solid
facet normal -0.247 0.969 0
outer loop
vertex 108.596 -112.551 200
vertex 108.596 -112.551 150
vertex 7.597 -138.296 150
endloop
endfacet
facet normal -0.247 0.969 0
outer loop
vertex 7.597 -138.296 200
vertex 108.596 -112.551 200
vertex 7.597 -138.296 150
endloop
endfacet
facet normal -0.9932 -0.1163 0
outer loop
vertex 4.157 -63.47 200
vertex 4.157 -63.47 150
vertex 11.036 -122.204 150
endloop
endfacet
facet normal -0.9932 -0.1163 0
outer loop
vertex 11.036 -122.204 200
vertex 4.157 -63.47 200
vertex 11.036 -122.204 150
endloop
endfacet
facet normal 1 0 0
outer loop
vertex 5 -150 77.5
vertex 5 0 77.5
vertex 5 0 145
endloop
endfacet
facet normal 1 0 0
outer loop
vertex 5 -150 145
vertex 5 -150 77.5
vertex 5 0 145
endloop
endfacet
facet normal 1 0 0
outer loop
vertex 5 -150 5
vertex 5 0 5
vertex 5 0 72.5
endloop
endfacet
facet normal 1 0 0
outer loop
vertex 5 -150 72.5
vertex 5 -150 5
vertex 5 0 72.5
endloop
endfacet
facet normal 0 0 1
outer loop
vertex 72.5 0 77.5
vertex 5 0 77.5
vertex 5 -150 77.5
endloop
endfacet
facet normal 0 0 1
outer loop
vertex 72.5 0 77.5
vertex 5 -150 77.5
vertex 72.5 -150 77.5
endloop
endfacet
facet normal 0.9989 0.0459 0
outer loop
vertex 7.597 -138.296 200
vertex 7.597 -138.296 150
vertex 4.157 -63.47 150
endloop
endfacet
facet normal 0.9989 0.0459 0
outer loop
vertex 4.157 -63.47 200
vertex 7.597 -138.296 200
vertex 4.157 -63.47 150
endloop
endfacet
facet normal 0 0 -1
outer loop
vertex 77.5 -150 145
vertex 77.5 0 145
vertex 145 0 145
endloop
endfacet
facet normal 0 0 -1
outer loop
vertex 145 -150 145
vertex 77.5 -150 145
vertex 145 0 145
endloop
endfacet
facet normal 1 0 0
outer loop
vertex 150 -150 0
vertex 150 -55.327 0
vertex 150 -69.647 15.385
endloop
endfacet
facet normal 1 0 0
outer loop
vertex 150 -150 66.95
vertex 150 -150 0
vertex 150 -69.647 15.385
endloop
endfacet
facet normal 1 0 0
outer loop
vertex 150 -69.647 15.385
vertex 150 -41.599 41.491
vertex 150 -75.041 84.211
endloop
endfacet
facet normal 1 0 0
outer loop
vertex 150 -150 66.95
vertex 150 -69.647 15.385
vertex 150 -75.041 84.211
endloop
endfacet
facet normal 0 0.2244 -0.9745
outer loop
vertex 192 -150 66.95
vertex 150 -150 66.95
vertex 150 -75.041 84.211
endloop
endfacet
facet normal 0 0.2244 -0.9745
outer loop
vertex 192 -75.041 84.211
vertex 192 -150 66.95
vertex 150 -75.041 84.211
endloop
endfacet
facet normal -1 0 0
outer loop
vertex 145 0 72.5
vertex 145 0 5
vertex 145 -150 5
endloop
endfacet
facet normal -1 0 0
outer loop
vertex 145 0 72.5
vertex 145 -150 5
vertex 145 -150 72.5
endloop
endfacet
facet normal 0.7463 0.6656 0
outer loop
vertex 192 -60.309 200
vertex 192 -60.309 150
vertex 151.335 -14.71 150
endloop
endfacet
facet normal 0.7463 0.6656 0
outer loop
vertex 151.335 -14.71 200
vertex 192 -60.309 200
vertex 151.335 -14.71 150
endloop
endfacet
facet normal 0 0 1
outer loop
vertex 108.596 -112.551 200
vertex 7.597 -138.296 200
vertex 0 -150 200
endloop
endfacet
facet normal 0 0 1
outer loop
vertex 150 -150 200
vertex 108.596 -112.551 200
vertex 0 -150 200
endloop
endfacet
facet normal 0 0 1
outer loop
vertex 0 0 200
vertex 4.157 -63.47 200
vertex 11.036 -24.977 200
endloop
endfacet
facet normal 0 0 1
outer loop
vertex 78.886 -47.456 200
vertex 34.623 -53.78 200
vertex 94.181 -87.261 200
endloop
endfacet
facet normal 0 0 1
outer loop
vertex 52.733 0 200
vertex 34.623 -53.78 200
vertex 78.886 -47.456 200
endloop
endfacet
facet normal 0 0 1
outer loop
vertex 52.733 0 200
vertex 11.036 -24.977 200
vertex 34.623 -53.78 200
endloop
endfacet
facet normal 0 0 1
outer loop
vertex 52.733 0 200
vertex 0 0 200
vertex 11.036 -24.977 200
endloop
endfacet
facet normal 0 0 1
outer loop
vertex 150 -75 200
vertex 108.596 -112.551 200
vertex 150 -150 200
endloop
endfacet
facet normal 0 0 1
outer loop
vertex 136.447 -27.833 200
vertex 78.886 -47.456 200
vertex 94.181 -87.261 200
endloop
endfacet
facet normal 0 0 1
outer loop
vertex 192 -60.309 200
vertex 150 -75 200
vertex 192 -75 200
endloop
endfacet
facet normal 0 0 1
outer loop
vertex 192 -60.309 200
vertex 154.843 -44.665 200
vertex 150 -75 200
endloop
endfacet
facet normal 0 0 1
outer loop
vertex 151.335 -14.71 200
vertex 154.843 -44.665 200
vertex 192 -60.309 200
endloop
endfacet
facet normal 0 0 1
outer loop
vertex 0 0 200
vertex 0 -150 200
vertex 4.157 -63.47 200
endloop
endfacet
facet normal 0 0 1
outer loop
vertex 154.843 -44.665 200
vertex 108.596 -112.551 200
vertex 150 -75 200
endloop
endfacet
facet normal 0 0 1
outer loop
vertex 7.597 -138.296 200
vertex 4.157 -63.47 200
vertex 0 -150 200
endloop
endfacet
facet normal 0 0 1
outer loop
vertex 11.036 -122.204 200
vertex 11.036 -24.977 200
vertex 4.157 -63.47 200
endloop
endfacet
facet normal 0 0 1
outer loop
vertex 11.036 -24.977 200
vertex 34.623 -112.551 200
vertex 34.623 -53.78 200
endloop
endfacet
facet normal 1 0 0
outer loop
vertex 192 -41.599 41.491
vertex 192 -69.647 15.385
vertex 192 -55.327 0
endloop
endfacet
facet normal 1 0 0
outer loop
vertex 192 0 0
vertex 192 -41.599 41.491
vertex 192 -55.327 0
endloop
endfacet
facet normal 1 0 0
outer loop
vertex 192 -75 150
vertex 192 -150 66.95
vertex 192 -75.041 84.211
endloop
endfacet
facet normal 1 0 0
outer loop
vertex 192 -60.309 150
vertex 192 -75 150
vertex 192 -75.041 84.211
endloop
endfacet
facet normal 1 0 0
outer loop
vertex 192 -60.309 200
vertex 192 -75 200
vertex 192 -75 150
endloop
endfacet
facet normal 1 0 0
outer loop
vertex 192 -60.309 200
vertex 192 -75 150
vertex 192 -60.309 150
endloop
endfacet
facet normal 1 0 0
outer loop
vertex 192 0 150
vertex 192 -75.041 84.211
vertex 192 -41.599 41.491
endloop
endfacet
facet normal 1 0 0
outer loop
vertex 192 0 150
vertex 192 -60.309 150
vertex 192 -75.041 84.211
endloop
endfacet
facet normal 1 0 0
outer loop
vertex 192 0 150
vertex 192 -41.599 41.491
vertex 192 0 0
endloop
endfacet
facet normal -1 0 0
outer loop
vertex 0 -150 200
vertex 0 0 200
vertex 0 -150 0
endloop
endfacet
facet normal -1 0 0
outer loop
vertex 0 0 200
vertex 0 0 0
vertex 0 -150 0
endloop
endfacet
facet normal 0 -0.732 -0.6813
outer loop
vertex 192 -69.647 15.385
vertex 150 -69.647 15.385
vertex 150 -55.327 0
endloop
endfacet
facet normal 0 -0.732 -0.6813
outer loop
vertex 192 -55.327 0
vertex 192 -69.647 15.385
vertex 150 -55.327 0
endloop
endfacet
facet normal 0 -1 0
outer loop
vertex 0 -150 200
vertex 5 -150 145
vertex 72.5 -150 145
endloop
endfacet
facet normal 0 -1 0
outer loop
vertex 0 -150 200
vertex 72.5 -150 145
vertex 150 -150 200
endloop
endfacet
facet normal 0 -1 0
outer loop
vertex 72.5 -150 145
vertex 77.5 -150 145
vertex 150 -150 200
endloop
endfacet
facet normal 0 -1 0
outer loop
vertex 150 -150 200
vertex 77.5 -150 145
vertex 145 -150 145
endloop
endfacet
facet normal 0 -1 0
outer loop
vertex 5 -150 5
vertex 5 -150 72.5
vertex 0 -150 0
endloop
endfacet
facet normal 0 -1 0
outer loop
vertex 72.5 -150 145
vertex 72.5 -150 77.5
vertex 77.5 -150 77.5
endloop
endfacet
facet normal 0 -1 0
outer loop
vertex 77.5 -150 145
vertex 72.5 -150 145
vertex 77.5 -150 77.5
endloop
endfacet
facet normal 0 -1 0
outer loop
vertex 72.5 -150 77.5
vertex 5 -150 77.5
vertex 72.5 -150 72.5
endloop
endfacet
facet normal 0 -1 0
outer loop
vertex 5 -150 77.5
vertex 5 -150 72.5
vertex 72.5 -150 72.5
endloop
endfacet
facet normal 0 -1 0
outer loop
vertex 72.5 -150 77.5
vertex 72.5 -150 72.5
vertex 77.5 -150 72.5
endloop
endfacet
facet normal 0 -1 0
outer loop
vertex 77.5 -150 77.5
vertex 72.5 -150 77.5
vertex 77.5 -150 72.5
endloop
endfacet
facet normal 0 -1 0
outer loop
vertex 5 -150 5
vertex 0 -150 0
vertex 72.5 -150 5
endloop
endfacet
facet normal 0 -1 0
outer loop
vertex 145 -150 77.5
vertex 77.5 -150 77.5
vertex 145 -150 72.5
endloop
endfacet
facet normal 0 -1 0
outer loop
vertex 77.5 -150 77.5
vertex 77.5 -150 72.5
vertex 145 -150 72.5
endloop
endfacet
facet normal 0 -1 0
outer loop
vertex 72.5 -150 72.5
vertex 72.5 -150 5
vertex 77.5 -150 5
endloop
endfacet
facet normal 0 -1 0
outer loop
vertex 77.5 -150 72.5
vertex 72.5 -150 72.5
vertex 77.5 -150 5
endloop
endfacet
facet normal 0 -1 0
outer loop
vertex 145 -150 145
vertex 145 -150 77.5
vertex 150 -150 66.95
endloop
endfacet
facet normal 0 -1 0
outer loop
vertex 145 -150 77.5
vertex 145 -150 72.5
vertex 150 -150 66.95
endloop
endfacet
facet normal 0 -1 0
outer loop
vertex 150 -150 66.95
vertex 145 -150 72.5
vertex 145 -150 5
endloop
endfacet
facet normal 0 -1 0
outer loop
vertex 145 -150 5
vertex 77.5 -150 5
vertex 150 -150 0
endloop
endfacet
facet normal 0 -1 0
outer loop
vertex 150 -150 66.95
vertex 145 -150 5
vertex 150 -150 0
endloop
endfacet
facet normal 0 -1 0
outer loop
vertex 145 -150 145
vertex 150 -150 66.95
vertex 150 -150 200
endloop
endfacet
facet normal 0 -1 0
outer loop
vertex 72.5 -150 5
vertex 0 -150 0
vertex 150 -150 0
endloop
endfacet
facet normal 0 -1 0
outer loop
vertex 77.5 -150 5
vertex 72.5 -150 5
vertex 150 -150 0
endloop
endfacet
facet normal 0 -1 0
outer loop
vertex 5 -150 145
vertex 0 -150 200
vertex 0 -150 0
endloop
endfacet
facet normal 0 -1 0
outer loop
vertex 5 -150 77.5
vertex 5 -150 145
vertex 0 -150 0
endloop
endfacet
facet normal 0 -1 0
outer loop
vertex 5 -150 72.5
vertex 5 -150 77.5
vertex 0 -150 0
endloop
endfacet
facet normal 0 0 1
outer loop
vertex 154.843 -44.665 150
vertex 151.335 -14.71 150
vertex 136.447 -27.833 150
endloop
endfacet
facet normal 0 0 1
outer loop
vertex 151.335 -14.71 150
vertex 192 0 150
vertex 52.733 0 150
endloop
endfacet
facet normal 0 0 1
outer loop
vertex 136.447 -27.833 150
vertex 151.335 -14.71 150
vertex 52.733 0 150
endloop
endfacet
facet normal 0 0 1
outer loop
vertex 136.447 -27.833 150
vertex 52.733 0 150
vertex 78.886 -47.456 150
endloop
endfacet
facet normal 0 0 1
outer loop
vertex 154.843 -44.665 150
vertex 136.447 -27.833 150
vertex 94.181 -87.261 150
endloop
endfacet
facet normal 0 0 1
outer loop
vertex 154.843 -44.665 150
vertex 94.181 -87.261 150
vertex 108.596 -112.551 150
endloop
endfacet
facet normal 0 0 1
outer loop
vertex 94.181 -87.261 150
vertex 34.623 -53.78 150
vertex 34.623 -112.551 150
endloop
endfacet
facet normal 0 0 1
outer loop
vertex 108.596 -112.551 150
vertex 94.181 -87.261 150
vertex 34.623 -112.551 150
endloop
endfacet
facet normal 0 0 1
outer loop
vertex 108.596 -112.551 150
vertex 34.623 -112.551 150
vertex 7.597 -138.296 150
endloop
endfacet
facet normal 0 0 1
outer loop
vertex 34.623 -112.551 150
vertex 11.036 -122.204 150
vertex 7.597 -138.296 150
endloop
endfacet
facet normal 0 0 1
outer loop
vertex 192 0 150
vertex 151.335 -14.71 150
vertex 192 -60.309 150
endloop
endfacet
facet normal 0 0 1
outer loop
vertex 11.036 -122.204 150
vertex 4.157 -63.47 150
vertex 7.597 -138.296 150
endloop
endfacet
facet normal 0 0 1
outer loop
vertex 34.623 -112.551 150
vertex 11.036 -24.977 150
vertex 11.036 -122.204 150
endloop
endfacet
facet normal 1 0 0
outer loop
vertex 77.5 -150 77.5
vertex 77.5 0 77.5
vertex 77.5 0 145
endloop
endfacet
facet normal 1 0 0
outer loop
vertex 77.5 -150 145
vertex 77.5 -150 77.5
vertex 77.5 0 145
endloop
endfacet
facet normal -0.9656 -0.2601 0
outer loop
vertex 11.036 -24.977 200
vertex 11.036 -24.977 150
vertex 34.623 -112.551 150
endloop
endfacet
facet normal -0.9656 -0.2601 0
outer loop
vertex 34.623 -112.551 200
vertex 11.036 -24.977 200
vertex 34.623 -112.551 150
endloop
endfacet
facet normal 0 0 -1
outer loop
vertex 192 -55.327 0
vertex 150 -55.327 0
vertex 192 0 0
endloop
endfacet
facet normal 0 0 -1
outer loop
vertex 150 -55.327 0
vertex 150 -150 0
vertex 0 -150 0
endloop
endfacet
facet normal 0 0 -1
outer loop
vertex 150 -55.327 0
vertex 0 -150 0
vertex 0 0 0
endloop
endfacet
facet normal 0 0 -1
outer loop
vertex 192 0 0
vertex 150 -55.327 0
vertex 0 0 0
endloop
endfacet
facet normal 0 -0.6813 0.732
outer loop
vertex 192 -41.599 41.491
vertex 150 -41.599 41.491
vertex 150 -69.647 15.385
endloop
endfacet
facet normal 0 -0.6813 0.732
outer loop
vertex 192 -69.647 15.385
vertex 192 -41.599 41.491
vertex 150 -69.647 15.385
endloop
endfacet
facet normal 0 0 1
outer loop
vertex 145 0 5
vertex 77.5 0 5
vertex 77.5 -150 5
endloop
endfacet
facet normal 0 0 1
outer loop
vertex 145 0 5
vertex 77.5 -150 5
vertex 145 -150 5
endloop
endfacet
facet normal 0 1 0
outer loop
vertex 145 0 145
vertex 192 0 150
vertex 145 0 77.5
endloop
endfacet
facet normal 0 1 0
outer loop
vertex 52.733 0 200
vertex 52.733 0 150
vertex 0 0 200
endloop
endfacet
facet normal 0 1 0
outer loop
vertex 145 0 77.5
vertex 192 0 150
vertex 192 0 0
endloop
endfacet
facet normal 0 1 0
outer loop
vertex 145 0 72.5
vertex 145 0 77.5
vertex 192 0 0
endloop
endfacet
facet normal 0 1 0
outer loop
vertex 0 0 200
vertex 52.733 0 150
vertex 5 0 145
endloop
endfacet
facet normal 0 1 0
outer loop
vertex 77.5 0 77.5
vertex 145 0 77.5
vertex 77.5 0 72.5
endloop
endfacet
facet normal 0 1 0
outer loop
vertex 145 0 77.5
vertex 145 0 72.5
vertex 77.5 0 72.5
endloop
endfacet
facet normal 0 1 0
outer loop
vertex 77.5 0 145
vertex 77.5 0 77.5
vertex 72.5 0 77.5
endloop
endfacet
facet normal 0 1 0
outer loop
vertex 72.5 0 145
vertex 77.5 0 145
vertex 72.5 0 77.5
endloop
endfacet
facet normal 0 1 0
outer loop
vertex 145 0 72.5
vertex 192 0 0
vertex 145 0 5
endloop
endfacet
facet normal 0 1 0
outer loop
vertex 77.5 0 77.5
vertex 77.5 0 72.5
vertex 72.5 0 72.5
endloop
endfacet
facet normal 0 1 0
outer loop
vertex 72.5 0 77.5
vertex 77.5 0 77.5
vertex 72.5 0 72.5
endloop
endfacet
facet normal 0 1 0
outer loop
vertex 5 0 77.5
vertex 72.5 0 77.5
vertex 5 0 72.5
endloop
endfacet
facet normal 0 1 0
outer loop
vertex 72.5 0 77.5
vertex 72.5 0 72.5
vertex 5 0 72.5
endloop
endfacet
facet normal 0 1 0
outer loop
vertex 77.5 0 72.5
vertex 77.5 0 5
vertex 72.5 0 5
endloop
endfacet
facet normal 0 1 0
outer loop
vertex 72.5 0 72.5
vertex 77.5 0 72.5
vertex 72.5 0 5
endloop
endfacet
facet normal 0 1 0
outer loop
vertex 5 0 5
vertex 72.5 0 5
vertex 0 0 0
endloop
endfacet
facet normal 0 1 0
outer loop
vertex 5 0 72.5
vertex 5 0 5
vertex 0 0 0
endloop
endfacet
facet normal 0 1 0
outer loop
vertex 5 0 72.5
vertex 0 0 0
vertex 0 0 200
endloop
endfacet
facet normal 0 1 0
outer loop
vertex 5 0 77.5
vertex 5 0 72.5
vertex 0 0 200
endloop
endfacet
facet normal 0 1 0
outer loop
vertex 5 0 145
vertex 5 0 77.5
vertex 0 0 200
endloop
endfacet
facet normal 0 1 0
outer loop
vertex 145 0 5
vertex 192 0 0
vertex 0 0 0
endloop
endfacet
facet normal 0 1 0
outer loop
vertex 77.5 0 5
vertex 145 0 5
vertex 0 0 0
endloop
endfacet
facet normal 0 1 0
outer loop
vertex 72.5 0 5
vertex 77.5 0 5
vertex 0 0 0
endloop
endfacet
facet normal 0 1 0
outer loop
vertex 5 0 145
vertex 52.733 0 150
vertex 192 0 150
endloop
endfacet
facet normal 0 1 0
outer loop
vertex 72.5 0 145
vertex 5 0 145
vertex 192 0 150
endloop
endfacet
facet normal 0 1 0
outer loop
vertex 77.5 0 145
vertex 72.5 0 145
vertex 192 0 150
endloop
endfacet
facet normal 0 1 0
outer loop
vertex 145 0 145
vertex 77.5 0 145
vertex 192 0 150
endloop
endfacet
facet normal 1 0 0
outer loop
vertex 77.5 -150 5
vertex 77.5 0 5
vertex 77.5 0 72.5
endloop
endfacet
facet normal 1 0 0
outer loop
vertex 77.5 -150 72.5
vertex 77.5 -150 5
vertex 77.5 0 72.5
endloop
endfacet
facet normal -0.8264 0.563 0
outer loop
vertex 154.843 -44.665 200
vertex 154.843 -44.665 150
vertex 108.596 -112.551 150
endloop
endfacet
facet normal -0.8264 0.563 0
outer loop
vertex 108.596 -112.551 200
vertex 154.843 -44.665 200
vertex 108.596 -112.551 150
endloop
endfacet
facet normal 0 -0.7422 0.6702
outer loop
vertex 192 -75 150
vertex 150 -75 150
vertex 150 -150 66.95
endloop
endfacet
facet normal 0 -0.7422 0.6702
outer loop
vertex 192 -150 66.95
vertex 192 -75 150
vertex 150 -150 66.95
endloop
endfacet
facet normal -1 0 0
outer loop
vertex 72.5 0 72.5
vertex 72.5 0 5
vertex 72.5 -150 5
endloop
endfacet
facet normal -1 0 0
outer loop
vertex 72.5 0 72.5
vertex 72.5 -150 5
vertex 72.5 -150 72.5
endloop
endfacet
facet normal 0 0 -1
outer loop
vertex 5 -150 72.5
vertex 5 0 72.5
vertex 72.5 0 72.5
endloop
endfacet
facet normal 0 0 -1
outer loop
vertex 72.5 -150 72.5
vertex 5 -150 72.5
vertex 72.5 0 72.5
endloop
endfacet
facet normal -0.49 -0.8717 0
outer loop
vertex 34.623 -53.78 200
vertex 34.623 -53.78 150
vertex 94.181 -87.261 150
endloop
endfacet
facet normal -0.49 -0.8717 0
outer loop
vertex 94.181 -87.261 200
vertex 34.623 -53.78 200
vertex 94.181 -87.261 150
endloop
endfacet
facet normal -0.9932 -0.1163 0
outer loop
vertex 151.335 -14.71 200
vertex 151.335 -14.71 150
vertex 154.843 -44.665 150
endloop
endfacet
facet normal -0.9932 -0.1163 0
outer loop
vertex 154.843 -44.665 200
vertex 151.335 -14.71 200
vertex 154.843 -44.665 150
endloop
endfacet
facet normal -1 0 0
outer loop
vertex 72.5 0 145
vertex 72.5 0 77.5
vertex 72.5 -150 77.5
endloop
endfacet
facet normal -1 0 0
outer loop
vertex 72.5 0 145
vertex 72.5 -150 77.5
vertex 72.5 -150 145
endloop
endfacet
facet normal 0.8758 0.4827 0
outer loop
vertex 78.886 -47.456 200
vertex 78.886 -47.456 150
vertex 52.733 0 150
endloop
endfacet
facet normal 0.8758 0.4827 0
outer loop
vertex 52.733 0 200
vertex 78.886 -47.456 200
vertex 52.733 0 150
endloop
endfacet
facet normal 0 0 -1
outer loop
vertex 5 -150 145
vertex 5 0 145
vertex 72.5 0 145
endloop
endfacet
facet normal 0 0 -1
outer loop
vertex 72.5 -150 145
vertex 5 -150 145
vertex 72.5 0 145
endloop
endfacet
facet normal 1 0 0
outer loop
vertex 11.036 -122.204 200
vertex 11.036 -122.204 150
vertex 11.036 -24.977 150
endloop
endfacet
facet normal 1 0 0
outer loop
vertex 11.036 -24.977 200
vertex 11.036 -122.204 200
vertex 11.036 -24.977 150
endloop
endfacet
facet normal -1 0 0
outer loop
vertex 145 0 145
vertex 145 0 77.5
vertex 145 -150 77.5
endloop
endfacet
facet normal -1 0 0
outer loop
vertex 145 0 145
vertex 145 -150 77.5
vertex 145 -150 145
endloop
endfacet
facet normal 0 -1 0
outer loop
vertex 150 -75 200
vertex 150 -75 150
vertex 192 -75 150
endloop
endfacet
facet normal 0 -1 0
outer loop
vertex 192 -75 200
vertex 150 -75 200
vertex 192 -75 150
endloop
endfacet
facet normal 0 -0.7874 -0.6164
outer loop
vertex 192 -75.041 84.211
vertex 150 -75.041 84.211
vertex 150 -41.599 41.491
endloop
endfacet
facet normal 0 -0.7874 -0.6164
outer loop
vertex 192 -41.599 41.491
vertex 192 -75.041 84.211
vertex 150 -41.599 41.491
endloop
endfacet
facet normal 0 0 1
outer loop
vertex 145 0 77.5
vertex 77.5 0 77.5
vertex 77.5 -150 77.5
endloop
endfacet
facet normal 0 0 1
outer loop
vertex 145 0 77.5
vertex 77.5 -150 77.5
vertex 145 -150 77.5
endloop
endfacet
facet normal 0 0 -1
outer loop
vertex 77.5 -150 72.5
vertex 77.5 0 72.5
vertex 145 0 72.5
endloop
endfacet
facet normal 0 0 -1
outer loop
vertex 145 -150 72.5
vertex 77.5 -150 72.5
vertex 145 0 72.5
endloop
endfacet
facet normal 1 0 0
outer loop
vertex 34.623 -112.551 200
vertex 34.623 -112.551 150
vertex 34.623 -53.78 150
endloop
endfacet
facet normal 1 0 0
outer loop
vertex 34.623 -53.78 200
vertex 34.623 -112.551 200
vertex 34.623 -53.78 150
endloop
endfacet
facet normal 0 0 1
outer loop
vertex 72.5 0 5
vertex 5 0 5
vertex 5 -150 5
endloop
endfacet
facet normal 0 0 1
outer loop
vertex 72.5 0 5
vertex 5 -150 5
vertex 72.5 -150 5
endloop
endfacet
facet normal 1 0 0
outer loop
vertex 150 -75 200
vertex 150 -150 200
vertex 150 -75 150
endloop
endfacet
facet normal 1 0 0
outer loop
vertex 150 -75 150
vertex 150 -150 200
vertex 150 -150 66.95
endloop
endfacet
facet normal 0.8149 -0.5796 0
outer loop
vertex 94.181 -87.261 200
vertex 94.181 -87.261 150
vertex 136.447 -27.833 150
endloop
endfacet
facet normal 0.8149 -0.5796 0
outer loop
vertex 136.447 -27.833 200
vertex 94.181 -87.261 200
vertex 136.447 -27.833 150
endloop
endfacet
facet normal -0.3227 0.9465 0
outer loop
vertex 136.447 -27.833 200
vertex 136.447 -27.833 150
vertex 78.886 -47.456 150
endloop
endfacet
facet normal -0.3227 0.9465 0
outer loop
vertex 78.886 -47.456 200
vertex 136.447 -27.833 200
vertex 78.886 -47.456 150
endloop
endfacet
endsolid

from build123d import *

# Parameters (mm, degrees)
F0_W     = 150
F0_H     = 150
F0_W_2   = 67.5
F0_H_2   = 67.5
F1_DEPTH = 150
F3_DEPTH = 42
F5_DEPTH = 50


with BuildPart() as f1:
    # F0 (on Front) → F1 (new body)
    with BuildSketch(Plane.XZ):
        with Locations((75, 75)):
            Rectangle(F0_W, F0_H)
        with Locations((38.75, 38.75)):
            Rectangle(F0_W_2, F0_H_2, mode=Mode.SUBTRACT)
        with Locations((111.25, 38.75)):
            Rectangle(F0_W_2, F0_H_2, mode=Mode.SUBTRACT)
        with Locations((38.75, 111.25)):
            Rectangle(F0_W_2, F0_H_2, mode=Mode.SUBTRACT)
        with Locations((111.25, 111.25)):
            Rectangle(F0_W_2, F0_H_2, mode=Mode.SUBTRACT)
    extrude(amount=F1_DEPTH)

    # F2 (on face) → F3 (join)
    with BuildSketch(Plane.YZ.offset(150)):
        Polygon((0, 150), (-75, 150), (-150, 66.9503435493), (-75.0411003828, 84.2106193304), (-41.5993146598, 41.4914414287), (-69.6472600102, 15.3852747753), (-55.3271184714, 0), (0, 0), align=None)
    extrude(amount=F3_DEPTH)

    # F4 (on face) → F5 (join)
    with BuildSketch(Plane.XY.offset(150)):
        Polygon((78.8858830929, -47.45561257), (52.7330078185, 0), (0, 0), (0, -150), (150, -150), (150, -75), (192, -75), (192, -60.3085644543), (151.335395945, -14.7103952784), (154.8433154821, -44.6645244956), (108.5957586765, -112.5511825085), (7.5965225697, -138.2962316275), (4.1573755443, -63.4704530239), (11.035669595, -122.2042143345), (11.035669595, -24.9770767987), (34.6234440804, -112.5511825085), (34.6234440804, -53.7799745798), (94.1806063056, -87.2614681721), (136.4469230175, -27.8326813132), align=None)
    extrude(amount=F5_DEPTH)


solid = f1.part
